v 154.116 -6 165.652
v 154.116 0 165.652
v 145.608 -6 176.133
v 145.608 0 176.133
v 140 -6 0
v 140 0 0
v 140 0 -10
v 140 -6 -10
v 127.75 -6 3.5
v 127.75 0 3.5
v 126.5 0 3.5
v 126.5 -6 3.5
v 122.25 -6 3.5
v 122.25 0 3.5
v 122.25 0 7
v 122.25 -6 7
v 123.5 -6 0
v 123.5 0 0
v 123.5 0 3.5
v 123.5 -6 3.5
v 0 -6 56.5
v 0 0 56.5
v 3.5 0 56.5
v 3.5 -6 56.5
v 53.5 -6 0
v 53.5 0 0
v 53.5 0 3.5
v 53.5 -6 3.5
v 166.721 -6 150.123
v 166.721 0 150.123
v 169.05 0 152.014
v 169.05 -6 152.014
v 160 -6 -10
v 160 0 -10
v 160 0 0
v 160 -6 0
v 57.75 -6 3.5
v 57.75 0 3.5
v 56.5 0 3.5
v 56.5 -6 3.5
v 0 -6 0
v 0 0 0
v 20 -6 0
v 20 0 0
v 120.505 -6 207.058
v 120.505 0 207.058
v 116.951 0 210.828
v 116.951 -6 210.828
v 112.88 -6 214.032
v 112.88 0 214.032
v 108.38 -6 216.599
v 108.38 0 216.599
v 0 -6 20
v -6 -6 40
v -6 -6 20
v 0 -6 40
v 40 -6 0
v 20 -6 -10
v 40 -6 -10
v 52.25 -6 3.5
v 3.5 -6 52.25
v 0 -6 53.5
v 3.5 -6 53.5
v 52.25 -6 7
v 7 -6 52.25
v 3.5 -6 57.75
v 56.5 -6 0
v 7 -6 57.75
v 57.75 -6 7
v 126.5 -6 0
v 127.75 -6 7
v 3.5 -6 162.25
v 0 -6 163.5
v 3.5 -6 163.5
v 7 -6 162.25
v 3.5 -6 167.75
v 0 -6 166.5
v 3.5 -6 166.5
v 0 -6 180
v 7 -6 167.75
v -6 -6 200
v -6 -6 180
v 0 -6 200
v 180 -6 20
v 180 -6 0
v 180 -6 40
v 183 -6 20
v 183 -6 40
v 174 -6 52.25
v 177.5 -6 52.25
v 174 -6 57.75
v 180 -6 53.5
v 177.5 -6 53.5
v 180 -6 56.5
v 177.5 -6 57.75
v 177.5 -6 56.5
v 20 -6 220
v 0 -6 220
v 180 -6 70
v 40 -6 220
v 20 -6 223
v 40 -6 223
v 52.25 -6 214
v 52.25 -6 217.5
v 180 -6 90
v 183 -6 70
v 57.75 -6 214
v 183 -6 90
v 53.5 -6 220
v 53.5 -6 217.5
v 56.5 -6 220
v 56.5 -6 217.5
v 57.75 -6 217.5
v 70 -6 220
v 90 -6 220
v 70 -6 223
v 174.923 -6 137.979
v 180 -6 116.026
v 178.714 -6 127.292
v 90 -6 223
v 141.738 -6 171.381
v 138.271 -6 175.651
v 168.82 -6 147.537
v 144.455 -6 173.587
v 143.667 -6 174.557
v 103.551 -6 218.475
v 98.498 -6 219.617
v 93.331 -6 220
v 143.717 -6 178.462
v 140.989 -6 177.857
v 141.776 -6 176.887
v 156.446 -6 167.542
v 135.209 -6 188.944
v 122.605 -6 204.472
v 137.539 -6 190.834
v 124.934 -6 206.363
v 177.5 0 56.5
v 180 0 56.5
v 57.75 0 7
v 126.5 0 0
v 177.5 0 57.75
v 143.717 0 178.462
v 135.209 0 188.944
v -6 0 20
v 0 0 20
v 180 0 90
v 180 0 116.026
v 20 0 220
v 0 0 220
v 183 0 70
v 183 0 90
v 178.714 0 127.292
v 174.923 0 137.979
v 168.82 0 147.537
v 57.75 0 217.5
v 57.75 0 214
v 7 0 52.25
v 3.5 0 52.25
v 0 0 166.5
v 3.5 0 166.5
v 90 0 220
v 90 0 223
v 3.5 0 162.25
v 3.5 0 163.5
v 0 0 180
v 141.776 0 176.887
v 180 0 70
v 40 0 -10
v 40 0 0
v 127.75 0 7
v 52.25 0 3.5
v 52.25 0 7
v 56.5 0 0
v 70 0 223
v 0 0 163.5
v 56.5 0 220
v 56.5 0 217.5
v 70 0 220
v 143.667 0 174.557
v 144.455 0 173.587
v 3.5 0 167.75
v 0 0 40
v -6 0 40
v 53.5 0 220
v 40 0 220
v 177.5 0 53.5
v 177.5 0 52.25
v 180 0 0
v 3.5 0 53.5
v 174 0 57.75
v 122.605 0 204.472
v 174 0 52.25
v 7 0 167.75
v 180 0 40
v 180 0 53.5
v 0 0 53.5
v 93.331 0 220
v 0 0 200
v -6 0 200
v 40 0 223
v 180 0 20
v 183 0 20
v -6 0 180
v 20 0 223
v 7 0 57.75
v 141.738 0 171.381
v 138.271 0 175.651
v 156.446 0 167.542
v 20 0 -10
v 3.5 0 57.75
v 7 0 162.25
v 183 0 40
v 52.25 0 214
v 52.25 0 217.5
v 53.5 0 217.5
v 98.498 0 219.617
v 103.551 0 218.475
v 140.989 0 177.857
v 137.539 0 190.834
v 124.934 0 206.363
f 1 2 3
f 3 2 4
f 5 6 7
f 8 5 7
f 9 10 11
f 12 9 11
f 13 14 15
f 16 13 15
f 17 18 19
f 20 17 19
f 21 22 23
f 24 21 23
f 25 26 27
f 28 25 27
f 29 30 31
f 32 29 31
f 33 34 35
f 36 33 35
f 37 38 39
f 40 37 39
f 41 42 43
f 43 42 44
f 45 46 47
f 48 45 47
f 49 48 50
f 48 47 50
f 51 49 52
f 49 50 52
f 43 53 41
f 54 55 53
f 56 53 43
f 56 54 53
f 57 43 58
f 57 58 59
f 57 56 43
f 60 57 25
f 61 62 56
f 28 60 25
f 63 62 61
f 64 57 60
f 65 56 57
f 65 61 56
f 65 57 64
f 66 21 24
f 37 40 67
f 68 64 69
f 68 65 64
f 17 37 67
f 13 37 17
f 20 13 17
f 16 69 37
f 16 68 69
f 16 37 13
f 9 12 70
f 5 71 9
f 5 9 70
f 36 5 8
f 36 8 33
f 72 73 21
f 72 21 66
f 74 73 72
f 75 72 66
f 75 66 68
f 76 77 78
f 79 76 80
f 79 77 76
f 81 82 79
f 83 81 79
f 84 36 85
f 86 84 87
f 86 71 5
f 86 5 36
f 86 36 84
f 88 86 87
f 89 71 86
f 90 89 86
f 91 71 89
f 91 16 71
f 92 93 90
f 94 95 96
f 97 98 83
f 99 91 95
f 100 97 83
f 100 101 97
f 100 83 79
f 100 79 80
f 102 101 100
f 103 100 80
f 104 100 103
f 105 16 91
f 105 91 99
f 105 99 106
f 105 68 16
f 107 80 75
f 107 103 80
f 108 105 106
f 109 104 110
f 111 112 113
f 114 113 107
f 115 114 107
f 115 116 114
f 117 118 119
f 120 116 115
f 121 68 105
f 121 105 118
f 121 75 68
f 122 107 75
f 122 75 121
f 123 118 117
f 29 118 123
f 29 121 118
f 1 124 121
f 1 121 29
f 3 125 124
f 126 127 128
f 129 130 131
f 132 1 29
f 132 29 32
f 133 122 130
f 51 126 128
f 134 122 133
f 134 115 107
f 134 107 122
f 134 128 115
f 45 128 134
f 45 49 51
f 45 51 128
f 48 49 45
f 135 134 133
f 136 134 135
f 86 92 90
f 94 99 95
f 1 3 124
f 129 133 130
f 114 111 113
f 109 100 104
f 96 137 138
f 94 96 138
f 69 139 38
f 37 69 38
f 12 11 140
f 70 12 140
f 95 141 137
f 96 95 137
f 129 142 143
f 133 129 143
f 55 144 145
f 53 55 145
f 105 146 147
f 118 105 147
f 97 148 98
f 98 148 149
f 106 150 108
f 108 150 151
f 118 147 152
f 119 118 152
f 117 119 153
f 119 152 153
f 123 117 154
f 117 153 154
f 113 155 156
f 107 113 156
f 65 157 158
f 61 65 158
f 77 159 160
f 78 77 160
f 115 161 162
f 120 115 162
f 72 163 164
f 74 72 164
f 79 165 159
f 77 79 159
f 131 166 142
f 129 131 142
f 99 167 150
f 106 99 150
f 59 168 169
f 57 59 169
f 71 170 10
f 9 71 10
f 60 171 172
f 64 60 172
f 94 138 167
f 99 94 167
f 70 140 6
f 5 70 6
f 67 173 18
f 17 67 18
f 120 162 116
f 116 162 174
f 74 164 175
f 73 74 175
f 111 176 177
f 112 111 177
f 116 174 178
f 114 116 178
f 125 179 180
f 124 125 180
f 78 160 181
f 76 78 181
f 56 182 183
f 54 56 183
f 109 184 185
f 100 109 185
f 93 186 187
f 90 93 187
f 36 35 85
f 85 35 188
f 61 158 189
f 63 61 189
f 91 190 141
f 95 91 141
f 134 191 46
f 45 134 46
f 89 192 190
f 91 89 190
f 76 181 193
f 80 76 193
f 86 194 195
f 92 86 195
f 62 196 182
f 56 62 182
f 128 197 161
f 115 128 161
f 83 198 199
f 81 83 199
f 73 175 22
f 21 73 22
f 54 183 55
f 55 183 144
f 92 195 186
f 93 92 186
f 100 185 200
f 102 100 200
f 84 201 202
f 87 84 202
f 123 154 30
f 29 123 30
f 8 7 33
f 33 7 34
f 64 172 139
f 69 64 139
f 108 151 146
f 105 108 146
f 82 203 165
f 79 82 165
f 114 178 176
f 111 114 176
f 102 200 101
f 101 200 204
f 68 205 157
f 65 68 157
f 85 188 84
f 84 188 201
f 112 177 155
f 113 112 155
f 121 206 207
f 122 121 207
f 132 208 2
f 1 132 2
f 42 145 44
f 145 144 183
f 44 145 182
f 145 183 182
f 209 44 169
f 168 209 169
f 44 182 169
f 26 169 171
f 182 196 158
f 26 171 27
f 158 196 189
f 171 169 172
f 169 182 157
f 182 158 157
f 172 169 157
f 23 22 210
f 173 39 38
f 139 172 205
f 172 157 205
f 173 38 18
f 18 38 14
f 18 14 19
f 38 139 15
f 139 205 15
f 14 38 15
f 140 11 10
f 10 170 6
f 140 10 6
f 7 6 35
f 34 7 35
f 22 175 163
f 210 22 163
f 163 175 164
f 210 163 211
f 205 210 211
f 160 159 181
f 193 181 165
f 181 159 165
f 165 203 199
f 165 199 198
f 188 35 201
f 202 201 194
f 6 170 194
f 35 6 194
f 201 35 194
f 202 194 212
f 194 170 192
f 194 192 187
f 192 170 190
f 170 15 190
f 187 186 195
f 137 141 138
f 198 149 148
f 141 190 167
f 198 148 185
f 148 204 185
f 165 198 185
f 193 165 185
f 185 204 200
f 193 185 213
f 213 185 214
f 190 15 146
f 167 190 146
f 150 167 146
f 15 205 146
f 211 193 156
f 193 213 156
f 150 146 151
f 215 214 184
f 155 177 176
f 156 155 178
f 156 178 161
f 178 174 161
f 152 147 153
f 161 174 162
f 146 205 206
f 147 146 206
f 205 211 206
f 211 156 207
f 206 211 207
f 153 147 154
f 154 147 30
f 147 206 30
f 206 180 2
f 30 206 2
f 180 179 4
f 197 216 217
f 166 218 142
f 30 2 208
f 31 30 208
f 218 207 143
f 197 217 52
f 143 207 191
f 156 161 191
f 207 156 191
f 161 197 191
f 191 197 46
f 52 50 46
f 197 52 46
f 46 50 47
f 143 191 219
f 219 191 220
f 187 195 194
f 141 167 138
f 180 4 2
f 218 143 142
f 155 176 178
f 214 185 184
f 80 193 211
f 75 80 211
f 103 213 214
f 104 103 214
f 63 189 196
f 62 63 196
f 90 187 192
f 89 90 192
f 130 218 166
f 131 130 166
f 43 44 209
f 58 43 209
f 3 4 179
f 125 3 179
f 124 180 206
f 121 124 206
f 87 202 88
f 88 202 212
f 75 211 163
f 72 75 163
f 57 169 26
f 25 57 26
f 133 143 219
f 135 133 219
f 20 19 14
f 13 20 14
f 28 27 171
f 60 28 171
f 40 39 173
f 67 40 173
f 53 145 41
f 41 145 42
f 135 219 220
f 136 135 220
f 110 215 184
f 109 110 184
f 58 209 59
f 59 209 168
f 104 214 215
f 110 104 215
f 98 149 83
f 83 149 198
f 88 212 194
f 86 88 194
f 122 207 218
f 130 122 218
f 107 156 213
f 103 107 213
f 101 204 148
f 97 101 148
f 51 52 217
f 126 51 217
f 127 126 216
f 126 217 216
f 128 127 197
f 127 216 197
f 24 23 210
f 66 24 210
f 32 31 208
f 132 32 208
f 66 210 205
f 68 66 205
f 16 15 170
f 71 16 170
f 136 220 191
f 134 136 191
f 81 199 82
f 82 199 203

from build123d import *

# Parameters (mm, degrees)
F1_DEPTH = 6


# Not quite as in the source:
# - a feature names something its author has since deleted; it is built from what else it names


with BuildPart() as f1:
    # F0 (on Front) → F1 (new body)
    with BuildSketch(Plane.XZ):
        with BuildLine():
            Line((20, 220), (0, 220))
            Line((0, 220), (0, 200))
            Line((0, 200), (-6, 200))
            Line((-6, 200), (-6, 180))
            Line((-6, 180), (0, 180))
            Line((0, 180), (0, 166.5))
            Line((0, 166.5), (3.5, 166.5))
            Line((3.5, 166.5), (3.5, 167.75))
            Line((3.5, 167.75), (7, 167.75))
            Line((7, 167.75), (7, 162.25))
            Line((7, 162.25), (3.5, 162.25))
            Line((3.5, 162.25), (3.5, 163.5))
            Line((3.5, 163.5), (0, 163.5))
            Line((0, 163.5), (0, 110))
            Line((0, 110), (0, 56.5))
            Line((0, 56.5), (3.5, 56.5))
            Line((3.5, 56.5), (3.5, 57.75))
            Line((3.5, 57.75), (7, 57.75))
            Line((7, 57.75), (7, 52.25))
            Line((7, 52.25), (3.5, 52.25))
            Line((3.5, 52.25), (3.5, 53.5))
            Line((3.5, 53.5), (0, 53.5))
            Line((0, 53.5), (0, 40))
            Line((0, 40), (-6, 40))
            Line((-6, 40), (-6, 20))
            Line((-6, 20), (0, 20))
            Line((0, 20), (0, 0))
            Line((0, 0), (20, 0))
            Line((20, 0), (20, -10))
            Line((20, -10), (40, -10))
            Line((40, -10), (40, 0))
            Line((40, 0), (53.5, 0))
            Line((53.5, 0), (53.5, 3.5))
            Line((53.5, 3.5), (52.25, 3.5))
            Line((52.25, 3.5), (52.25, 7))
            Line((52.25, 7), (57.75, 7))
            Line((57.75, 7), (57.75, 3.5))
            Line((57.75, 3.5), (56.5, 3.5))
            Line((56.5, 3.5), (56.5, 0))
            Line((56.5, 0), (90, 0))
            Line((90, 0), (123.5, 0))
            Line((123.5, 0), (123.5, 3.5))
            Line((123.5, 3.5), (122.25, 3.5))
            Line((122.25, 3.5), (122.25, 7))
            Line((122.25, 7), (127.75, 7))
            Line((127.75, 7), (127.75, 3.5))
            Line((127.75, 3.5), (126.5, 3.5))
            Line((126.5, 3.5), (126.5, 0))
            Line((126.5, 0), (140, 0))
            Line((140, 0), (140, -10))
            Line((140, -10), (160, -10))
            Line((160, -10), (160, 0))
            Line((160, 0), (180, 0))
            Line((180, 0), (180, 20))
            Line((180, 20), (183, 20))
            Line((183, 20), (183, 40))
            Line((183, 40), (180, 40))
            Line((180, 40), (180, 53.5))
            Line((180, 53.5), (177.5, 53.5))
            Line((177.5, 53.5), (177.5, 52.25))
            Line((177.5, 52.25), (174, 52.25))
            Line((174, 52.25), (174, 57.75))
            Line((174, 57.75), (177.5, 57.75))
            Line((177.5, 57.75), (177.5, 56.5))
            Line((177.5, 56.5), (180, 56.5))
            Line((180, 56.5), (180, 70))
            Line((180, 70), (183, 70))
            Line((183, 70), (183, 90))
            Line((183, 90), (180, 90))
            Line((180, 90), (180, 110))
            Line((180, 110), (180, 116.0255279073))
            ThreePointArc((180, 116.0255279073), (177.1222639523, 132.7435493216), (168.8203103996, 147.5371686211))
            Line((168.8203103996, 147.5371686211), (166.7209532849, 150.1234412807))
            Line((166.7209532849, 150.1234412807), (169.0501719088, 152.0141397235))
            Line((169.0501719088, 152.0141397235), (156.4455156233, 167.5422638833))
            Line((156.4455156233, 167.5422638833), (154.1162969993, 165.6515654405))
            Line((154.1162969993, 165.6515654405), (145.6081540066, 176.1330492484))
            Line((145.6081540066, 176.1330492484), (143.6671384866, 174.5574672127))
            Line((143.6671384866, 174.5574672127), (144.4549295045, 173.5869594527))
            Line((144.4549295045, 173.5869594527), (141.7375077765, 171.3811446028))
            Line((141.7375077765, 171.3811446028), (138.271227298, 175.6513787467))
            Line((138.271227298, 175.6513787467), (140.988649026, 177.8571935967))
            Line((140.988649026, 177.8571935967), (141.7764400438, 176.8866858367))
            Line((141.7764400438, 176.8866858367), (143.7174555638, 178.4622678724))
            Line((143.7174555638, 178.4622678724), (135.2093125711, 188.9437516803))
            Line((135.2093125711, 188.9437516803), (137.538531195, 190.8344501231))
            Line((137.538531195, 190.8344501231), (124.9338749095, 206.362574283))
            Line((124.9338749095, 206.362574283), (122.6046562855, 204.4718758401))
            Line((122.6046562855, 204.4718758401), (120.5052991708, 207.0581484997))
            ThreePointArc((120.5052991708, 207.0581484997), (114.9751472562, 212.5051710496), (108.3804141438, 216.5993290869))
            ThreePointArc((108.3804141438, 216.5993290869), (101.0454672184, 219.1392480735), (93.331081891, 220))
            Line((93.331081891, 220), (90, 220))
            Line((90, 220), (90, 223))
            Line((90, 223), (70, 223))
            Line((70, 223), (70, 220))
            Line((70, 220), (56.5, 220))
            Line((56.5, 220), (56.5, 217.5))
            Line((56.5, 217.5), (57.75, 217.5))
            Line((57.75, 217.5), (57.75, 214))
            Line((57.75, 214), (52.25, 214))
            Line((52.25, 214), (52.25, 217.5))
            Line((52.25, 217.5), (53.5, 217.5))
            Line((53.5, 217.5), (53.5, 220))
            Line((53.5, 220), (40, 220))
            Line((40, 220), (40, 223))
            Line((40, 223), (20, 223))
            Line((20, 223), (20, 220))
        make_face()
    extrude(amount=F1_DEPTH)


solid = f1.part
